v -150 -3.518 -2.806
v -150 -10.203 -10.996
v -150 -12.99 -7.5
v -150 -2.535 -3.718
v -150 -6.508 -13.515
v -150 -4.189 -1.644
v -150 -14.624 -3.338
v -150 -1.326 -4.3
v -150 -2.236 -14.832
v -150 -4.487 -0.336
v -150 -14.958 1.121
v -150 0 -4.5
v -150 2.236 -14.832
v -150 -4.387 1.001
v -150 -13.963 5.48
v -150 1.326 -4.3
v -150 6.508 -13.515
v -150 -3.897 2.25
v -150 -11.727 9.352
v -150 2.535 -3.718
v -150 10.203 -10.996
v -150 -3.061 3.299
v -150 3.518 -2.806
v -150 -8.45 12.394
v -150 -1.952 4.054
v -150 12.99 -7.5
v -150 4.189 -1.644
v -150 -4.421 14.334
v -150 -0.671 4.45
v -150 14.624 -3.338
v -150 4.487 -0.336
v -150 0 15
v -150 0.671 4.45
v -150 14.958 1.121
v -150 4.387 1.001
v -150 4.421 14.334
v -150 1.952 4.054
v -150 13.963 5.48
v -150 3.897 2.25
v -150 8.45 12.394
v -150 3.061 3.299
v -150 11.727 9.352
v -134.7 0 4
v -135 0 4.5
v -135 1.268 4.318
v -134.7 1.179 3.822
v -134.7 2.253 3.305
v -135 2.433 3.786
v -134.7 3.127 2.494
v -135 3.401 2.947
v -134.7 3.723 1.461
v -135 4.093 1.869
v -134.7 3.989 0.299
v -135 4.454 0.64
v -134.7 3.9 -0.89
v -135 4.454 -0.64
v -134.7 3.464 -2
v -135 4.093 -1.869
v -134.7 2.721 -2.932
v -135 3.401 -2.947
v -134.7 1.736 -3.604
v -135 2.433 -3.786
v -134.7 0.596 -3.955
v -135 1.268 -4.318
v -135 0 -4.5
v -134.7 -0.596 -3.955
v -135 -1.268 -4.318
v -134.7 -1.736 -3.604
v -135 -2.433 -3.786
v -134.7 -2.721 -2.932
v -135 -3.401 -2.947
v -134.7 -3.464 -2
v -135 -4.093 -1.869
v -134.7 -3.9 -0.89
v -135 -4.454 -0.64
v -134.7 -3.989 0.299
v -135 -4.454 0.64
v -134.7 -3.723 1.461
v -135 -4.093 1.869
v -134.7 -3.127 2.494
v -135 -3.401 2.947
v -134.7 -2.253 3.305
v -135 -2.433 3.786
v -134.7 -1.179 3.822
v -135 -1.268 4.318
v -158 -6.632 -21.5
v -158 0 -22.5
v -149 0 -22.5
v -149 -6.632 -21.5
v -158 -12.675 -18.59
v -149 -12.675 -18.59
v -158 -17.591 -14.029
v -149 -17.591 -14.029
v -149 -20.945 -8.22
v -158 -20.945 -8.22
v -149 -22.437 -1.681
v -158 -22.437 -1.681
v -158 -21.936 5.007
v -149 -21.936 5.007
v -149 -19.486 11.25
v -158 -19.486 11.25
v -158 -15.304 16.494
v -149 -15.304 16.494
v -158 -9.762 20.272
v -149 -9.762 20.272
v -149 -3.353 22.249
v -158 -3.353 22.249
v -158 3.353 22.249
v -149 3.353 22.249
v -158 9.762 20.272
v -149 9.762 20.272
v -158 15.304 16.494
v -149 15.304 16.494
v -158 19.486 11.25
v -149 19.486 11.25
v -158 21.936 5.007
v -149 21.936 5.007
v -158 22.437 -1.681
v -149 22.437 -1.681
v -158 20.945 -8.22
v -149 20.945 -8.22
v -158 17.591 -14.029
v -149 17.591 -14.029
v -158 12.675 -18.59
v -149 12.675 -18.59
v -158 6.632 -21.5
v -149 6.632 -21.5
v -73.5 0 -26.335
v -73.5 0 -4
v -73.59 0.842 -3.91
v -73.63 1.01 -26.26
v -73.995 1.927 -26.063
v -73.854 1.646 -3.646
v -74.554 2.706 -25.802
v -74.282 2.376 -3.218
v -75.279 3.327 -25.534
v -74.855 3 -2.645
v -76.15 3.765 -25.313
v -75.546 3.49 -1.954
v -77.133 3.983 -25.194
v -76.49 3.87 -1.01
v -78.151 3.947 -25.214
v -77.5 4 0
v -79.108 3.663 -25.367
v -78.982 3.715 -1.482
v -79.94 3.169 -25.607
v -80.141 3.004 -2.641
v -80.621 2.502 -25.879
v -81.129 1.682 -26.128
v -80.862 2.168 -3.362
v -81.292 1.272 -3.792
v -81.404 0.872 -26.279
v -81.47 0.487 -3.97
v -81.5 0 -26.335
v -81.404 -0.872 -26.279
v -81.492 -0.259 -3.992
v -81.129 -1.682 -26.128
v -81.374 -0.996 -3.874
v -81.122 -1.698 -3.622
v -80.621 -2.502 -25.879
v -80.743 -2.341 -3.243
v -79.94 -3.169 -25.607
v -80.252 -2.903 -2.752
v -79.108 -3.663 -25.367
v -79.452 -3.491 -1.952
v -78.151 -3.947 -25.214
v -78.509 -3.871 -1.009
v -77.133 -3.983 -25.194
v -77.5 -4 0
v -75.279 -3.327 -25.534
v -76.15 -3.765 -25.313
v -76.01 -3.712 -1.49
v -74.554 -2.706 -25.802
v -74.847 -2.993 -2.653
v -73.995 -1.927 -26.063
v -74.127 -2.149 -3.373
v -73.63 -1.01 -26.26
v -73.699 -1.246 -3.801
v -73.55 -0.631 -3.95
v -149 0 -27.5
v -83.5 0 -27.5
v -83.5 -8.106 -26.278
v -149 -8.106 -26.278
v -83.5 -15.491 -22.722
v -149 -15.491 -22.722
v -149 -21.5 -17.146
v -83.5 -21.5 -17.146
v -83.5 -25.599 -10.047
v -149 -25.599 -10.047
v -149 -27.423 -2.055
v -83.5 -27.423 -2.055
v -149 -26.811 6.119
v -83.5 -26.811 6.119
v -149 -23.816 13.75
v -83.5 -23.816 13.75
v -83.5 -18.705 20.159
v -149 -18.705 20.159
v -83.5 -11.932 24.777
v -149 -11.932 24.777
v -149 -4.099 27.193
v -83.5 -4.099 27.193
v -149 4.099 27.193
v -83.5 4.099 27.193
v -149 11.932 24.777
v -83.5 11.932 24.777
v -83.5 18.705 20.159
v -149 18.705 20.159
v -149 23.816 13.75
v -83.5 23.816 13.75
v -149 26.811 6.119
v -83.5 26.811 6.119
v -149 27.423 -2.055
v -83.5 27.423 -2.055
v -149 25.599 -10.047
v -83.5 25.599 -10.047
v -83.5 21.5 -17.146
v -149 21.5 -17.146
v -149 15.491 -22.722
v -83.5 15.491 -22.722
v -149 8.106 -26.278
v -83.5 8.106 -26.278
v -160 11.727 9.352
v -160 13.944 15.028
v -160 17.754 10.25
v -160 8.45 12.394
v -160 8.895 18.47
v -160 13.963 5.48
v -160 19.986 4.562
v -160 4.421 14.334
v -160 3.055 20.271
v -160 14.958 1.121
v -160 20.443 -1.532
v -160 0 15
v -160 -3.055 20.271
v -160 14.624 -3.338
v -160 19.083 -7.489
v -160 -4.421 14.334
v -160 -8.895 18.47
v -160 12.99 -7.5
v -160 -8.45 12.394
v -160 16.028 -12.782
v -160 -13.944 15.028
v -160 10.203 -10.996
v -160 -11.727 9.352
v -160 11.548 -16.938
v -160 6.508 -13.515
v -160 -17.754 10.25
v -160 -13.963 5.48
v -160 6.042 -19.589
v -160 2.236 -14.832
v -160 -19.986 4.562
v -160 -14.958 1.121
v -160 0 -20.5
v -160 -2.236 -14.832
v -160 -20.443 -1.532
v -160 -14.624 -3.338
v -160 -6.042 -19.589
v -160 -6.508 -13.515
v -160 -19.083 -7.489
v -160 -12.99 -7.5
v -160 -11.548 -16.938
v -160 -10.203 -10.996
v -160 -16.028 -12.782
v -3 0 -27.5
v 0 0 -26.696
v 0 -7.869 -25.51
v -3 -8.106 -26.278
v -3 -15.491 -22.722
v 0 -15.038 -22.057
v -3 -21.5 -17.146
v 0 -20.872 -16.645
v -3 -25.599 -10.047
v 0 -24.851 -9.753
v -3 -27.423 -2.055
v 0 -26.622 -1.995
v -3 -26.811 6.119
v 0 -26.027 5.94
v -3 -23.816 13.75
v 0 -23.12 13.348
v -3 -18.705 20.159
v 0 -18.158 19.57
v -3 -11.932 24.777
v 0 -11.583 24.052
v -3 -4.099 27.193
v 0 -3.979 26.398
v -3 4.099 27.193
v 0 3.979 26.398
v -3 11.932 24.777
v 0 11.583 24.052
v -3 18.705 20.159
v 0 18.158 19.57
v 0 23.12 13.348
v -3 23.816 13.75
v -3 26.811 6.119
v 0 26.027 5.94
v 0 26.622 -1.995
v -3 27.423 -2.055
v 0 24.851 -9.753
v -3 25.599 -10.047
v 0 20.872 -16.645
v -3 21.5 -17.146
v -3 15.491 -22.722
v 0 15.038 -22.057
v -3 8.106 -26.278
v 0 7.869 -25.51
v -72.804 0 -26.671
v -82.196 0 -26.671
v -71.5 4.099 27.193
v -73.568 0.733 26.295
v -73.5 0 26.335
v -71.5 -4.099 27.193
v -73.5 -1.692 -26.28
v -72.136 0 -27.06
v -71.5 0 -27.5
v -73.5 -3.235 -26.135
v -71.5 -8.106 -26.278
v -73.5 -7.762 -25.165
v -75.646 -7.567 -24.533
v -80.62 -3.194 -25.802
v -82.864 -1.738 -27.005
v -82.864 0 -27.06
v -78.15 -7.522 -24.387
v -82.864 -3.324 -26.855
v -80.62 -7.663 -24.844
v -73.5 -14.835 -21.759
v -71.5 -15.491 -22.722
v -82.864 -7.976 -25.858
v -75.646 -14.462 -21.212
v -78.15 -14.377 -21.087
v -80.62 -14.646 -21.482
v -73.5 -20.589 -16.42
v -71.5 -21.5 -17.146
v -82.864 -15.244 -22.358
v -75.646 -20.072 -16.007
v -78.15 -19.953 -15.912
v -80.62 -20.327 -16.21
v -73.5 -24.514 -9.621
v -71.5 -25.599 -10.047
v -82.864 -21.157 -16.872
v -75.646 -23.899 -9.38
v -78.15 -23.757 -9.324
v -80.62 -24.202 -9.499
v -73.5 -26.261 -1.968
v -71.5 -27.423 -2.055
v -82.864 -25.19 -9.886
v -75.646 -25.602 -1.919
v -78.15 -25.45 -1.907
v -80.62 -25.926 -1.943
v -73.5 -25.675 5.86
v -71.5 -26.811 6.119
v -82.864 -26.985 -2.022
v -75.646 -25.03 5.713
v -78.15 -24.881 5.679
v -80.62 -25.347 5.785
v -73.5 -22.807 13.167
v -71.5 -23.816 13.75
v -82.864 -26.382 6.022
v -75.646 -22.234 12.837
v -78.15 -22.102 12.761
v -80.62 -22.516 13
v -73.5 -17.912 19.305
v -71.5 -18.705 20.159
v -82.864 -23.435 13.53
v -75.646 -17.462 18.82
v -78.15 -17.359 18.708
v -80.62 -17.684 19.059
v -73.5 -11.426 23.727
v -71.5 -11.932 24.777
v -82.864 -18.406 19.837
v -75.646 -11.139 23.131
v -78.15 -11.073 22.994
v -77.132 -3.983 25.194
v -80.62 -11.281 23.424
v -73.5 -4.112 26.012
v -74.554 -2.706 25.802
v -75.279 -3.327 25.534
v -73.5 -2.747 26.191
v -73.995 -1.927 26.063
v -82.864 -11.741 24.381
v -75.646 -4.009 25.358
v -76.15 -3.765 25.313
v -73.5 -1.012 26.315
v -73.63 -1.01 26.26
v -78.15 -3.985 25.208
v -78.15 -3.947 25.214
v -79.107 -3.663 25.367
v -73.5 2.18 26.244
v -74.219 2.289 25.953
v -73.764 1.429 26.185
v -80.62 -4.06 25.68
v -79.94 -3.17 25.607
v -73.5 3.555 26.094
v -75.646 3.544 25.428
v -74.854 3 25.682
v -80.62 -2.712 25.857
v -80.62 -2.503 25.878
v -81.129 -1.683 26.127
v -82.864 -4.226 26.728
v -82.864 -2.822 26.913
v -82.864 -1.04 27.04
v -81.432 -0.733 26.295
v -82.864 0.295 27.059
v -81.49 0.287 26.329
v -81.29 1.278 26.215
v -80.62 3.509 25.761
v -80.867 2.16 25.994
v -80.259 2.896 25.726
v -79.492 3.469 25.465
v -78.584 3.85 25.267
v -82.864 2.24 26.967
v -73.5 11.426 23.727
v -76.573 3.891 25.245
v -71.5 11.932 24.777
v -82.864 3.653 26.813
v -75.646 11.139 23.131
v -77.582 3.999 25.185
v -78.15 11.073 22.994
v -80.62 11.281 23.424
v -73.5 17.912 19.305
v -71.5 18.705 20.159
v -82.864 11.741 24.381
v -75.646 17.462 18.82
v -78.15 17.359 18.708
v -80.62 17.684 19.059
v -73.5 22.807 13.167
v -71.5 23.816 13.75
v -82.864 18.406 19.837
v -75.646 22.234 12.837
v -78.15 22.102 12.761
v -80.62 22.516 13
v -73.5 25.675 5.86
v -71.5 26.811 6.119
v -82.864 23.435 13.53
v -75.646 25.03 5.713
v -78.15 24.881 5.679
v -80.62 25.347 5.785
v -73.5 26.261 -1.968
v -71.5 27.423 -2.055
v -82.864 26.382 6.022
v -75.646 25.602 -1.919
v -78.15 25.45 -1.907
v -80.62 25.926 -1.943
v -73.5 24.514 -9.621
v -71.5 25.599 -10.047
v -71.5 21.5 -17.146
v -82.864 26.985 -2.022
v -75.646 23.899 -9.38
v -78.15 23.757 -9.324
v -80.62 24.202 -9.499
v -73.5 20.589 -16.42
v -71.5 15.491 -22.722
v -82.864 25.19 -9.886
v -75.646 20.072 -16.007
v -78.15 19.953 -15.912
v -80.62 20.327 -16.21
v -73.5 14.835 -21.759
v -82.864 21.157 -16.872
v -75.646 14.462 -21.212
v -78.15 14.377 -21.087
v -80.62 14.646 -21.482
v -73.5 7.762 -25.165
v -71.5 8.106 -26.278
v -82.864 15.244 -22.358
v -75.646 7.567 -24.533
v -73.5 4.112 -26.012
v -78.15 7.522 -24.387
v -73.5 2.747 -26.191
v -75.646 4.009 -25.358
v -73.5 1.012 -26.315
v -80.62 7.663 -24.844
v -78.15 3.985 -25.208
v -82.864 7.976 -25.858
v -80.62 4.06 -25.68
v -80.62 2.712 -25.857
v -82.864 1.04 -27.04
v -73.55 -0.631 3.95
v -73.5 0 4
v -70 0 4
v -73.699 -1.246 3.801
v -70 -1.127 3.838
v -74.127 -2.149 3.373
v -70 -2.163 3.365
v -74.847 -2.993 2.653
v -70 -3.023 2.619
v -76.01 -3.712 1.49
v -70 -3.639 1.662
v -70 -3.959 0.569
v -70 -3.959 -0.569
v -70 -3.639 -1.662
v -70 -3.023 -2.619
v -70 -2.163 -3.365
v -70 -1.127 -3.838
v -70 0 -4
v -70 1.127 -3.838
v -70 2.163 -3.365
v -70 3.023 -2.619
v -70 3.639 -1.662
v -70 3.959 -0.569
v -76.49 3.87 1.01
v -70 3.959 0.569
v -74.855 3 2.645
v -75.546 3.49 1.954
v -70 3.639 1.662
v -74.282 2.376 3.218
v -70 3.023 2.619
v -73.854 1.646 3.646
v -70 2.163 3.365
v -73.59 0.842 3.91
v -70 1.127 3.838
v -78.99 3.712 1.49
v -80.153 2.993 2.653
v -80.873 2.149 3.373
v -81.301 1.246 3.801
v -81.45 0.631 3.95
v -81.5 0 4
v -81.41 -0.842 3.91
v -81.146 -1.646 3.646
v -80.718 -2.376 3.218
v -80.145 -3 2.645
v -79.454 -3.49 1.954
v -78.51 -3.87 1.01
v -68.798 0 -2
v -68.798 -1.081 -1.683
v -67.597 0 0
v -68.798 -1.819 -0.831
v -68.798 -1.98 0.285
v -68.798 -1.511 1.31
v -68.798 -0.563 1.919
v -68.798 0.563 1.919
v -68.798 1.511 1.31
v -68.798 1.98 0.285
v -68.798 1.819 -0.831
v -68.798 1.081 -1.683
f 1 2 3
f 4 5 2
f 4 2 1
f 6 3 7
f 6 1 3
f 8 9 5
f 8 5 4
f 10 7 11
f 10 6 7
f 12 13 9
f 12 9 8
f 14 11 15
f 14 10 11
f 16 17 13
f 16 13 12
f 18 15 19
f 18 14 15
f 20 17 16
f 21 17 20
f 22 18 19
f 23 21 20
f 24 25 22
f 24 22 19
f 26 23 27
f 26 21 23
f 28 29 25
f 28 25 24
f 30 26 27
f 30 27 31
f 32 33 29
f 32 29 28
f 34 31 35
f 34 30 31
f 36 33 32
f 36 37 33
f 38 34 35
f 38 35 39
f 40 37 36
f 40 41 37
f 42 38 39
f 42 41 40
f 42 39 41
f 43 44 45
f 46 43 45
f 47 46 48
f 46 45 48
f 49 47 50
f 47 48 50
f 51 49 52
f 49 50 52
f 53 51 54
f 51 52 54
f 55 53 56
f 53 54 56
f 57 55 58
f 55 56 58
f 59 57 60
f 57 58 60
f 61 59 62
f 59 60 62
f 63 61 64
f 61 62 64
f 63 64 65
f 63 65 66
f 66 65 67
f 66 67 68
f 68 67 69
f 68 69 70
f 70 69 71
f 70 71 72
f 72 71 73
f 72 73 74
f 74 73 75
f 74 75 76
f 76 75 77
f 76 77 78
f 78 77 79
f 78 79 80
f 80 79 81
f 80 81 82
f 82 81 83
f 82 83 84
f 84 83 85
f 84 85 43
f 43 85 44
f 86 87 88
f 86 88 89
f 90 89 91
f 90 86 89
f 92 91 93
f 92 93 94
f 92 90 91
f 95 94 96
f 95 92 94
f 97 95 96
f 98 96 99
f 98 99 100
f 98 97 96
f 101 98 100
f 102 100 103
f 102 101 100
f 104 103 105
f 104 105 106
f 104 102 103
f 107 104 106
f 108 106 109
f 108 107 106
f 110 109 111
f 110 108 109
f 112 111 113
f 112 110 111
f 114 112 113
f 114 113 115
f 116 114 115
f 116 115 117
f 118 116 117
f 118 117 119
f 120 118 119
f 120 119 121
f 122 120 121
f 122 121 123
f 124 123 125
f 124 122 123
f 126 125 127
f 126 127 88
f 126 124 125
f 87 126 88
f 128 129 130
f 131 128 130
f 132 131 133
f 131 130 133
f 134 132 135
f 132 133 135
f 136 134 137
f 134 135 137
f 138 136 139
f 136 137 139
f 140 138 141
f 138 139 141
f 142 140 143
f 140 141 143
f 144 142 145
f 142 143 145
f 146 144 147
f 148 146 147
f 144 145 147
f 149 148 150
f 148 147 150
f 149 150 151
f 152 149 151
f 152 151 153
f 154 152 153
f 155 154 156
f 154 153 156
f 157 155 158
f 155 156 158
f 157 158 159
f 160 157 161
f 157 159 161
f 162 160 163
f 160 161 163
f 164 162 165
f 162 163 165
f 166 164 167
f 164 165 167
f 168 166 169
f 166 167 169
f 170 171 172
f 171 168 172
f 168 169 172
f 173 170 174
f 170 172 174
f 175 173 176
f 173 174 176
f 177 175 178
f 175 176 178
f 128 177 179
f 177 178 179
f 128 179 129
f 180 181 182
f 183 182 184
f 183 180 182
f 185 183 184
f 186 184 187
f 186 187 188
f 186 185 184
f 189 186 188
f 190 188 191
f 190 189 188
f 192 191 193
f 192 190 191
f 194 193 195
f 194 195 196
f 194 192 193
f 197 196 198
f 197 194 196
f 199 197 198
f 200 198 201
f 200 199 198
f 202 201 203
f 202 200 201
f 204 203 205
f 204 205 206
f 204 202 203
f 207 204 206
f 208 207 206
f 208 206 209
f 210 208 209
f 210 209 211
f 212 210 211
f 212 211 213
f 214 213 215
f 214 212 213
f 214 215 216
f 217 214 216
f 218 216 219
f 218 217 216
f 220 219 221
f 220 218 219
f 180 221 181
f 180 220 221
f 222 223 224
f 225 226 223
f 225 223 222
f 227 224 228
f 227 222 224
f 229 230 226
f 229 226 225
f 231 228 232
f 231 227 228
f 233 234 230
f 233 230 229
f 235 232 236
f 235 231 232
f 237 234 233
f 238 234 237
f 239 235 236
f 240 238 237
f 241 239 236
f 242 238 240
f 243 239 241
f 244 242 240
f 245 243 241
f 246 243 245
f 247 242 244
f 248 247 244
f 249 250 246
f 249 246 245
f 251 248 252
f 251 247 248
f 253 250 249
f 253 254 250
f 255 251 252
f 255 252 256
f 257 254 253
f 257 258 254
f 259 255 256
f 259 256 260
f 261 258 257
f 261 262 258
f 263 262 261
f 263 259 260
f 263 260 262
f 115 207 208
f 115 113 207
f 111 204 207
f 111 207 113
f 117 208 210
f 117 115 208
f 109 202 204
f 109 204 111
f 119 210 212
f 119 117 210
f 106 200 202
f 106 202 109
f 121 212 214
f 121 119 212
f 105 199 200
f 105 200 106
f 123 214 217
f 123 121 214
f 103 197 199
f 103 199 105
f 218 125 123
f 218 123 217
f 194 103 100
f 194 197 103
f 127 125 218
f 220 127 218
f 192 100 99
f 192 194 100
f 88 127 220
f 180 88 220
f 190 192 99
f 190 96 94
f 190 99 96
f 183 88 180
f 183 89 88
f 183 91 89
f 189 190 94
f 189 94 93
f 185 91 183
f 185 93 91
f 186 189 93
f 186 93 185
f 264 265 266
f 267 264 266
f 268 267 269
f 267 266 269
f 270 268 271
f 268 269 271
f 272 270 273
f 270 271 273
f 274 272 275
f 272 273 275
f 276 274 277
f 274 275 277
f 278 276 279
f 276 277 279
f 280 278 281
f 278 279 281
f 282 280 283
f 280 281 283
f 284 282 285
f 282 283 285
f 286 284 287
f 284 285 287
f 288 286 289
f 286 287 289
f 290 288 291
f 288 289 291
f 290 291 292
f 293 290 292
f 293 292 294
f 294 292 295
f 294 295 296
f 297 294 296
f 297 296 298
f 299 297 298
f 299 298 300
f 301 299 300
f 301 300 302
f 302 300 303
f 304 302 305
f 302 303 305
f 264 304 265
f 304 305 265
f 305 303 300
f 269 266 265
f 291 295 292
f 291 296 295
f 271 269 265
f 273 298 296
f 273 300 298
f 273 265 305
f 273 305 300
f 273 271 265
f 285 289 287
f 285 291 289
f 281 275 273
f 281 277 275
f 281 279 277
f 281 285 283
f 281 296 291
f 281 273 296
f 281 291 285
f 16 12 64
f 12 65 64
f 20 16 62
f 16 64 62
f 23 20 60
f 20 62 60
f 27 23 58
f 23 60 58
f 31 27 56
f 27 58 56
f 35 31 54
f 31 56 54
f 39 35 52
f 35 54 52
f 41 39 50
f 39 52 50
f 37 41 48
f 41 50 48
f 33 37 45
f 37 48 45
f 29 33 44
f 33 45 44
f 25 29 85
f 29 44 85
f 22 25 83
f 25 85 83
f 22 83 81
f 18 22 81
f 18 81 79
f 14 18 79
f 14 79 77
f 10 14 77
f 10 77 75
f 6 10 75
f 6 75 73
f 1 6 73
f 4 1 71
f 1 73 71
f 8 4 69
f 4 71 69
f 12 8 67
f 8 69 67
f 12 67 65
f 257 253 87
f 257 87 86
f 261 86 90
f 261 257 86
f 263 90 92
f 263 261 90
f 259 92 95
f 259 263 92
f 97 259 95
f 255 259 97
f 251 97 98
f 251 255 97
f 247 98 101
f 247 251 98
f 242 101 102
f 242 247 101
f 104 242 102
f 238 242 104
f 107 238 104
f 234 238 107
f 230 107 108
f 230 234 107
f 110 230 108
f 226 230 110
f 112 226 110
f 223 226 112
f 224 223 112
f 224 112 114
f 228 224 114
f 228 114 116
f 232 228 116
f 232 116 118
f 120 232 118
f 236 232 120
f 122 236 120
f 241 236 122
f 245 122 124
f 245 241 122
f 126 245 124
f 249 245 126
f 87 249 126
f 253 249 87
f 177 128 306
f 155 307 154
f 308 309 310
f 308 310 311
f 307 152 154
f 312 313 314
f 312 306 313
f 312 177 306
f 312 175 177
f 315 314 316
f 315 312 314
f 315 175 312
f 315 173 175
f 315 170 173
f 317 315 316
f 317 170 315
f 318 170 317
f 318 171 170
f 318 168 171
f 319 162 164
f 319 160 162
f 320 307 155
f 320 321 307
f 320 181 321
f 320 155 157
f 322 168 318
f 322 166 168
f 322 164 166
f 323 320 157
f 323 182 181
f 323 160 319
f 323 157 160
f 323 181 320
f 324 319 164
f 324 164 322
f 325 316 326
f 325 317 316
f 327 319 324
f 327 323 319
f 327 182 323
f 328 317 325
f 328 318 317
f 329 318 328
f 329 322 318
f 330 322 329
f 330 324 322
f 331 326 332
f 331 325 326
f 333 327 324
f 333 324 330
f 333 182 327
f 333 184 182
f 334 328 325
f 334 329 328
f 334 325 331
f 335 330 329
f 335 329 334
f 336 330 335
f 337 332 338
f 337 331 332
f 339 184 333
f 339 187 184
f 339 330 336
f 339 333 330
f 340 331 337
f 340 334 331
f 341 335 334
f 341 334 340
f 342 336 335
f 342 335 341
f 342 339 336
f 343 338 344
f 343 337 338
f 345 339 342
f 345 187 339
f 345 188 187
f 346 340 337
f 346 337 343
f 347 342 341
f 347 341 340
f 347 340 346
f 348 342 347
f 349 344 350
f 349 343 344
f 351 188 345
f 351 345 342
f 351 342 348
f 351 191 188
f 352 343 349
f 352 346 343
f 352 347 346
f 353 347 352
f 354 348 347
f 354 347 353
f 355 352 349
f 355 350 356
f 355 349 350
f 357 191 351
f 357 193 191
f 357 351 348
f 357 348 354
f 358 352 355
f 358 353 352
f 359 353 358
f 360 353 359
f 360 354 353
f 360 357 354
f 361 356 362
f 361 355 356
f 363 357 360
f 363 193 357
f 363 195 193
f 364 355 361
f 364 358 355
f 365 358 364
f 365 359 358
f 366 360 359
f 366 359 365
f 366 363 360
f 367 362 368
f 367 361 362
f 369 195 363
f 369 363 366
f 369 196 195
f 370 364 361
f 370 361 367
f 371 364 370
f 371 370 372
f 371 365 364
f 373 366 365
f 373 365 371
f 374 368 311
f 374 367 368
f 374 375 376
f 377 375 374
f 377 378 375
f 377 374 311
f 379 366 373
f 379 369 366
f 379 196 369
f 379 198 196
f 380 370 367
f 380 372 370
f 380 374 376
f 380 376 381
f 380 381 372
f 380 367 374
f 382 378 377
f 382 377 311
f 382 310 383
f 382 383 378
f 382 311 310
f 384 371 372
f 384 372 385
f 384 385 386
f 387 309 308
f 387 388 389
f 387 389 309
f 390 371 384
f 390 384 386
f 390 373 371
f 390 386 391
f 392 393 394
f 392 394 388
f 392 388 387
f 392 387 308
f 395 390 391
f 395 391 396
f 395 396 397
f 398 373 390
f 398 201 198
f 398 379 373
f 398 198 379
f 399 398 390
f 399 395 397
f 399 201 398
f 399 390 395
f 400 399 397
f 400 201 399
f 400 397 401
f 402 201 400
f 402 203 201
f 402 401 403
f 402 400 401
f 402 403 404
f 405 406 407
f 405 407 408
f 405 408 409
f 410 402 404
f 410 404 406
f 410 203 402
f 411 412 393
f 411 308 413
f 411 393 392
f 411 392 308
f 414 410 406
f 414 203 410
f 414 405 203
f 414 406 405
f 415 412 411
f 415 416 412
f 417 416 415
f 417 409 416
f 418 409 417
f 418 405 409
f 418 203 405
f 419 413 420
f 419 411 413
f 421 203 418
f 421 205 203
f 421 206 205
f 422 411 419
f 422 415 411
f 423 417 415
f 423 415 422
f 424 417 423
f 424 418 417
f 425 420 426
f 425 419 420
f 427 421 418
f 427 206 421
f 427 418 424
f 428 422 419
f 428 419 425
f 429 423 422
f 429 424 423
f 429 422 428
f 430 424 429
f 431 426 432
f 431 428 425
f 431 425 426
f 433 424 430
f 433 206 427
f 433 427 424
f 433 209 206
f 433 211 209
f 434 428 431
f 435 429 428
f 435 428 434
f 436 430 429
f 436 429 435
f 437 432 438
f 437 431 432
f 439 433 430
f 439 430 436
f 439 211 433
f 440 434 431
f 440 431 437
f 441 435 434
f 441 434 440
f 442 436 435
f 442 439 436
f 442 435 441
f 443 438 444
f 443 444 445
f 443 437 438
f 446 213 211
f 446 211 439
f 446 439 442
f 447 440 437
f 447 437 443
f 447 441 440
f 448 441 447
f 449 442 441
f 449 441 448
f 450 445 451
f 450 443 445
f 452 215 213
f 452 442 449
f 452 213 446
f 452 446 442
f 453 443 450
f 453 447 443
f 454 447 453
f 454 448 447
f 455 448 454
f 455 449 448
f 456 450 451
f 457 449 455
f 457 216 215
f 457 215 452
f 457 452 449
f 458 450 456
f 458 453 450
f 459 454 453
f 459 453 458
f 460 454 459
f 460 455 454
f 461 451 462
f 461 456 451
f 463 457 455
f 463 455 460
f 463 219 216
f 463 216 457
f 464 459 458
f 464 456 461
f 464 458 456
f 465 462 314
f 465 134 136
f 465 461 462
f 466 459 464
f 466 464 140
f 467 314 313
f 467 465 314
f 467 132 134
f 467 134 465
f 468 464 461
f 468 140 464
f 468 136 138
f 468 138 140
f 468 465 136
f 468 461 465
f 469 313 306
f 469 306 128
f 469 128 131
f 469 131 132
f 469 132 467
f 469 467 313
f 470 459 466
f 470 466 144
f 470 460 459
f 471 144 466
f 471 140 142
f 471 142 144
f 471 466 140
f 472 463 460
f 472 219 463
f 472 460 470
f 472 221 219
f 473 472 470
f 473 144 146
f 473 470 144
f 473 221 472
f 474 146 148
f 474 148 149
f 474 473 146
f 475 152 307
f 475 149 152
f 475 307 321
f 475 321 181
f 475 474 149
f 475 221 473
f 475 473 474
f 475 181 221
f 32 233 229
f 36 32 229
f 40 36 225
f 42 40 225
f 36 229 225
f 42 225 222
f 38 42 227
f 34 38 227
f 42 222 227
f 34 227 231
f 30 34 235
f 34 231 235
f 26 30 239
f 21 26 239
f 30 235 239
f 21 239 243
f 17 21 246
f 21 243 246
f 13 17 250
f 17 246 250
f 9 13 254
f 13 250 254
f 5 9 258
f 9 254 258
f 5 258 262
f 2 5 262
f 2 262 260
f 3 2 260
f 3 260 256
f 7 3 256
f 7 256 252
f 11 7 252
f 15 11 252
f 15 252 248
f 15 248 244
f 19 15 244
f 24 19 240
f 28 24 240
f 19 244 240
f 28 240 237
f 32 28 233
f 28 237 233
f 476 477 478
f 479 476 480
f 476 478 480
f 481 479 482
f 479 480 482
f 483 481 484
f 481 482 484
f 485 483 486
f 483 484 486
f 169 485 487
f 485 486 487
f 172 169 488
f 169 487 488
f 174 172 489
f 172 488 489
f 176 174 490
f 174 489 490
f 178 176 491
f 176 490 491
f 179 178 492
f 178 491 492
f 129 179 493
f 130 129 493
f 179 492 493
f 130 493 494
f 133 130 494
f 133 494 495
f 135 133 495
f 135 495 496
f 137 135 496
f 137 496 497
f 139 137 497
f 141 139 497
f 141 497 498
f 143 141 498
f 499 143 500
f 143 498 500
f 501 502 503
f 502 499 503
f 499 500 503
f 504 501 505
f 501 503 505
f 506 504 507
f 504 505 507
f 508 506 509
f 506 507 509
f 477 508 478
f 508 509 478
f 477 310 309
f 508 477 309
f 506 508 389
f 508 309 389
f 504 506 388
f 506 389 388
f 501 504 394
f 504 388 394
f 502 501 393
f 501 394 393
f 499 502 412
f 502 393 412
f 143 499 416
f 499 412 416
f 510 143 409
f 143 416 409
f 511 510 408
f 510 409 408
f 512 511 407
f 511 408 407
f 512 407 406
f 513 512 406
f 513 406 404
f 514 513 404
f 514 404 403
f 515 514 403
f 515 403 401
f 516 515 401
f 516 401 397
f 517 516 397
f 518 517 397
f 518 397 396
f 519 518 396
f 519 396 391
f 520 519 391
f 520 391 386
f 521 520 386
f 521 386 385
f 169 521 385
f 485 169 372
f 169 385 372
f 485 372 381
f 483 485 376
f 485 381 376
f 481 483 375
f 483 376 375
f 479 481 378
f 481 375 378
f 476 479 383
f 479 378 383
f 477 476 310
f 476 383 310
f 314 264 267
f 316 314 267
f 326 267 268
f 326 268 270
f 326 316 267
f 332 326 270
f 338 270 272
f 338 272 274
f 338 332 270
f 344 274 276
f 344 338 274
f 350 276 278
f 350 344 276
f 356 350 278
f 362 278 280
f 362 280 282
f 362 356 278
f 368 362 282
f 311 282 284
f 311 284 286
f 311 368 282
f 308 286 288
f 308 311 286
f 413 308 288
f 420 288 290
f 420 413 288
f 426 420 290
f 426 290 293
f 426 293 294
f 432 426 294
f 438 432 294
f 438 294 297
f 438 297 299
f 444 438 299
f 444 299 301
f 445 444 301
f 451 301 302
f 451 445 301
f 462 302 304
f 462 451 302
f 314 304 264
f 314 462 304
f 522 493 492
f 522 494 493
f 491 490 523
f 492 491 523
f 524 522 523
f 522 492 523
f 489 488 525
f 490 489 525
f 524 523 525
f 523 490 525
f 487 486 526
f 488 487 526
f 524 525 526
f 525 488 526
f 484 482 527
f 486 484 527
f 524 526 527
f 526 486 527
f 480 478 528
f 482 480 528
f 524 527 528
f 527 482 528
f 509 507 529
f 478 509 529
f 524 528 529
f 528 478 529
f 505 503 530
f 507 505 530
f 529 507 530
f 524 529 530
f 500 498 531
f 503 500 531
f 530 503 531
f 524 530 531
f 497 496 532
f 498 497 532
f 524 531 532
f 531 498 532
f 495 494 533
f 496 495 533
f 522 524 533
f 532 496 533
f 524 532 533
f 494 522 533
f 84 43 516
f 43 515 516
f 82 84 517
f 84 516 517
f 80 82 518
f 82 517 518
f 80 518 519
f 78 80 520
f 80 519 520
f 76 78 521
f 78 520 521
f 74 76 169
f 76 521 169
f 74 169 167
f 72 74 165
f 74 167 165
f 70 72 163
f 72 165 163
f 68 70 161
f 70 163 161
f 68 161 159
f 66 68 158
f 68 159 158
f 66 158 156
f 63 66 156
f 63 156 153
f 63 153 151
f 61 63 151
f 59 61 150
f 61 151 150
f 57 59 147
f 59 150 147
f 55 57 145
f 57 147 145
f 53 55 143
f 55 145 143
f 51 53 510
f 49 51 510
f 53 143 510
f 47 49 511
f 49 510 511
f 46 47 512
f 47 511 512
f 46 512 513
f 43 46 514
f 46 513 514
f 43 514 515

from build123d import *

# Parameters (mm, degrees)
SKETCH_2_R                = 4
CUT_EXTRUDE_1_DEPTH       = 30
CHAMFER_1_SIZE            = 2
CHAMFER_2_SIZE            = 3
CHAMFER_2_SIZE2           = 0.803847577
SKETCH_6_R                = 15
CUT_EXTRUDE_3_DEPTH       = 10
HOLE_WIZARD_8_0_8_1_D     = 8
HOLE_WIZARD_8_0_8_1_DEPTH = 80
HOLE_WIZARD_8_0_8_1_TIP   = 2.403442476
M10X1_0_1_D               = 9
M10X1_0_1_DEPTH           = 15
M10X1_0_1_TIP             = 2.703872786


with BuildPart() as part:
    # 草图1 → 旋转1 (revolve)
    with BuildSketch(Plane.XY, mode=Mode.PRIVATE) as revolve_1_sk:
        with BuildLine():
            Line((0, 0), (0, 27.5))
            Line((0, 27.5), (-71.5, 27.5))
            ThreePointArc((-71.5, 27.5), (-77.5, 25.5), (-83.5, 27.5))
            Line((-83.5, 27.5), (-149, 27.5))
            Line((-149, 27.5), (-149, 22.5))
            Line((-149, 22.5), (-160, 22.5))
            Line((-160, 22.5), (-160, 0))
            Line((-160, 0), (0, 0))
        make_face()
    revolve(revolve_1_sk.sketch.rotate(Axis((0, 0, 0), (-1, 0, 0)), 90), axis=Axis((0, 0, 0), (-1, 0, 0)))

    # 草图2 → 切除-拉伸1 (cut, symmetric)
    with BuildSketch(Plane.XY):
        with Locations((-77.5, 0)):
            Circle(SKETCH_2_R)
    extrude(amount=CUT_EXTRUDE_1_DEPTH, both=True, mode=Mode.SUBTRACT)

    # 倒角1
    chamfer_1_edges = [part.edges().sort_by_distance(p)[0] for p in [
        (-160, 0, 22.5),
    ]]
    chamfer(chamfer_1_edges, length=CHAMFER_1_SIZE)

    # 倒角2
    chamfer_2_edges = [part.edges().sort_by_distance(p)[0] for p in [
        (0, 0, 27.5),
    ]]
    chamfer_2_side = [part.faces().sort_by_distance(p)[0] for p in [
        (-35.75, 0, 27.5),
    ]]
    chamfer(chamfer_2_edges, length=CHAMFER_2_SIZE, length2=CHAMFER_2_SIZE2, reference=chamfer_2_side[0])

    # 草图6 → 切除-拉伸3 (cut)
    with BuildSketch(Plane.ZY.offset(160)):
        Circle(SKETCH_6_R)
    extrude(amount=-CUT_EXTRUDE_3_DEPTH, mode=Mode.SUBTRACT)

    # Ø8.0 (8) 直径孔1
    with Locations(Plane(origin=(-150, 0, 0), x_dir=(0, 0, -1), z_dir=(-1, 0, 0))):
        with Locations((0, 0)):
            Hole(HOLE_WIZARD_8_0_8_1_D / 2, depth=HOLE_WIZARD_8_0_8_1_DEPTH)
            with Locations((0, 0, -(HOLE_WIZARD_8_0_8_1_DEPTH + HOLE_WIZARD_8_0_8_1_TIP / 2))):  # 118° drill point
                Cone(0, HOLE_WIZARD_8_0_8_1_D / 2, HOLE_WIZARD_8_0_8_1_TIP, mode=Mode.SUBTRACT)

    # M10x1.0 螺纹孔1
    with Locations(Plane.ZY.offset(150)):
        with Locations((0, 0)):
            Hole(M10X1_0_1_D / 2, depth=M10X1_0_1_DEPTH)
            with Locations((0, 0, -(M10X1_0_1_DEPTH + M10X1_0_1_TIP / 2))):  # 118° drill point
                Cone(0, M10X1_0_1_D / 2, M10X1_0_1_TIP, mode=Mode.SUBTRACT)


solid = part.part
